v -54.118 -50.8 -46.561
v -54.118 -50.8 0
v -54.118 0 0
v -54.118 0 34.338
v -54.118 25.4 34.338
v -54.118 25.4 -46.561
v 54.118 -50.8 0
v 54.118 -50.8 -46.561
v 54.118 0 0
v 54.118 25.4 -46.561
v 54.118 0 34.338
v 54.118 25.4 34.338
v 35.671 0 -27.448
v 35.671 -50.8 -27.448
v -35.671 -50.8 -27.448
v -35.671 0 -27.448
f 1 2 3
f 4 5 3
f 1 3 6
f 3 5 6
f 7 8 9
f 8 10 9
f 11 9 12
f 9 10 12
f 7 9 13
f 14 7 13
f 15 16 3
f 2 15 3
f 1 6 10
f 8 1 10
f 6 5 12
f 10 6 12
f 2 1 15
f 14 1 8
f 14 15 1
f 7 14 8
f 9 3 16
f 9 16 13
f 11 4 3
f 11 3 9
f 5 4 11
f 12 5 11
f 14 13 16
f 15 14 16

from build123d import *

# Parameters (mm, degrees)
F0_W     = 108.235746
F0_H     = 80.899004
F1_DEPTH = 25.4
F3_DEPTH = 50.8


with BuildPart() as f1:
    # F0 (on Front) → F1 (new body)
    with BuildSketch(Plane.XZ):
        with Locations((0, -6.111877)):
            Rectangle(F0_W, F0_H)
    extrude(amount=-F1_DEPTH)

    # F2 (on face) → F3 (join)
    with BuildSketch(Plane.XZ):
        Polygon((-35.671126, -27.447874), (-54.117873, -27.447874), (-54.117873, -46.561379), (54.117873, -46.561379), (54.117873, -27.447874), (35.671126, -27.447874), align=None)
        Polygon((-54.117873, 0), (-54.117873, -27.447874), (-35.671126, -27.447874), align=None)
        Polygon((54.117873, 0), (35.671126, -27.447874), (54.117873, -27.447874), align=None)
    extrude(amount=F3_DEPTH)


solid = f1.part
